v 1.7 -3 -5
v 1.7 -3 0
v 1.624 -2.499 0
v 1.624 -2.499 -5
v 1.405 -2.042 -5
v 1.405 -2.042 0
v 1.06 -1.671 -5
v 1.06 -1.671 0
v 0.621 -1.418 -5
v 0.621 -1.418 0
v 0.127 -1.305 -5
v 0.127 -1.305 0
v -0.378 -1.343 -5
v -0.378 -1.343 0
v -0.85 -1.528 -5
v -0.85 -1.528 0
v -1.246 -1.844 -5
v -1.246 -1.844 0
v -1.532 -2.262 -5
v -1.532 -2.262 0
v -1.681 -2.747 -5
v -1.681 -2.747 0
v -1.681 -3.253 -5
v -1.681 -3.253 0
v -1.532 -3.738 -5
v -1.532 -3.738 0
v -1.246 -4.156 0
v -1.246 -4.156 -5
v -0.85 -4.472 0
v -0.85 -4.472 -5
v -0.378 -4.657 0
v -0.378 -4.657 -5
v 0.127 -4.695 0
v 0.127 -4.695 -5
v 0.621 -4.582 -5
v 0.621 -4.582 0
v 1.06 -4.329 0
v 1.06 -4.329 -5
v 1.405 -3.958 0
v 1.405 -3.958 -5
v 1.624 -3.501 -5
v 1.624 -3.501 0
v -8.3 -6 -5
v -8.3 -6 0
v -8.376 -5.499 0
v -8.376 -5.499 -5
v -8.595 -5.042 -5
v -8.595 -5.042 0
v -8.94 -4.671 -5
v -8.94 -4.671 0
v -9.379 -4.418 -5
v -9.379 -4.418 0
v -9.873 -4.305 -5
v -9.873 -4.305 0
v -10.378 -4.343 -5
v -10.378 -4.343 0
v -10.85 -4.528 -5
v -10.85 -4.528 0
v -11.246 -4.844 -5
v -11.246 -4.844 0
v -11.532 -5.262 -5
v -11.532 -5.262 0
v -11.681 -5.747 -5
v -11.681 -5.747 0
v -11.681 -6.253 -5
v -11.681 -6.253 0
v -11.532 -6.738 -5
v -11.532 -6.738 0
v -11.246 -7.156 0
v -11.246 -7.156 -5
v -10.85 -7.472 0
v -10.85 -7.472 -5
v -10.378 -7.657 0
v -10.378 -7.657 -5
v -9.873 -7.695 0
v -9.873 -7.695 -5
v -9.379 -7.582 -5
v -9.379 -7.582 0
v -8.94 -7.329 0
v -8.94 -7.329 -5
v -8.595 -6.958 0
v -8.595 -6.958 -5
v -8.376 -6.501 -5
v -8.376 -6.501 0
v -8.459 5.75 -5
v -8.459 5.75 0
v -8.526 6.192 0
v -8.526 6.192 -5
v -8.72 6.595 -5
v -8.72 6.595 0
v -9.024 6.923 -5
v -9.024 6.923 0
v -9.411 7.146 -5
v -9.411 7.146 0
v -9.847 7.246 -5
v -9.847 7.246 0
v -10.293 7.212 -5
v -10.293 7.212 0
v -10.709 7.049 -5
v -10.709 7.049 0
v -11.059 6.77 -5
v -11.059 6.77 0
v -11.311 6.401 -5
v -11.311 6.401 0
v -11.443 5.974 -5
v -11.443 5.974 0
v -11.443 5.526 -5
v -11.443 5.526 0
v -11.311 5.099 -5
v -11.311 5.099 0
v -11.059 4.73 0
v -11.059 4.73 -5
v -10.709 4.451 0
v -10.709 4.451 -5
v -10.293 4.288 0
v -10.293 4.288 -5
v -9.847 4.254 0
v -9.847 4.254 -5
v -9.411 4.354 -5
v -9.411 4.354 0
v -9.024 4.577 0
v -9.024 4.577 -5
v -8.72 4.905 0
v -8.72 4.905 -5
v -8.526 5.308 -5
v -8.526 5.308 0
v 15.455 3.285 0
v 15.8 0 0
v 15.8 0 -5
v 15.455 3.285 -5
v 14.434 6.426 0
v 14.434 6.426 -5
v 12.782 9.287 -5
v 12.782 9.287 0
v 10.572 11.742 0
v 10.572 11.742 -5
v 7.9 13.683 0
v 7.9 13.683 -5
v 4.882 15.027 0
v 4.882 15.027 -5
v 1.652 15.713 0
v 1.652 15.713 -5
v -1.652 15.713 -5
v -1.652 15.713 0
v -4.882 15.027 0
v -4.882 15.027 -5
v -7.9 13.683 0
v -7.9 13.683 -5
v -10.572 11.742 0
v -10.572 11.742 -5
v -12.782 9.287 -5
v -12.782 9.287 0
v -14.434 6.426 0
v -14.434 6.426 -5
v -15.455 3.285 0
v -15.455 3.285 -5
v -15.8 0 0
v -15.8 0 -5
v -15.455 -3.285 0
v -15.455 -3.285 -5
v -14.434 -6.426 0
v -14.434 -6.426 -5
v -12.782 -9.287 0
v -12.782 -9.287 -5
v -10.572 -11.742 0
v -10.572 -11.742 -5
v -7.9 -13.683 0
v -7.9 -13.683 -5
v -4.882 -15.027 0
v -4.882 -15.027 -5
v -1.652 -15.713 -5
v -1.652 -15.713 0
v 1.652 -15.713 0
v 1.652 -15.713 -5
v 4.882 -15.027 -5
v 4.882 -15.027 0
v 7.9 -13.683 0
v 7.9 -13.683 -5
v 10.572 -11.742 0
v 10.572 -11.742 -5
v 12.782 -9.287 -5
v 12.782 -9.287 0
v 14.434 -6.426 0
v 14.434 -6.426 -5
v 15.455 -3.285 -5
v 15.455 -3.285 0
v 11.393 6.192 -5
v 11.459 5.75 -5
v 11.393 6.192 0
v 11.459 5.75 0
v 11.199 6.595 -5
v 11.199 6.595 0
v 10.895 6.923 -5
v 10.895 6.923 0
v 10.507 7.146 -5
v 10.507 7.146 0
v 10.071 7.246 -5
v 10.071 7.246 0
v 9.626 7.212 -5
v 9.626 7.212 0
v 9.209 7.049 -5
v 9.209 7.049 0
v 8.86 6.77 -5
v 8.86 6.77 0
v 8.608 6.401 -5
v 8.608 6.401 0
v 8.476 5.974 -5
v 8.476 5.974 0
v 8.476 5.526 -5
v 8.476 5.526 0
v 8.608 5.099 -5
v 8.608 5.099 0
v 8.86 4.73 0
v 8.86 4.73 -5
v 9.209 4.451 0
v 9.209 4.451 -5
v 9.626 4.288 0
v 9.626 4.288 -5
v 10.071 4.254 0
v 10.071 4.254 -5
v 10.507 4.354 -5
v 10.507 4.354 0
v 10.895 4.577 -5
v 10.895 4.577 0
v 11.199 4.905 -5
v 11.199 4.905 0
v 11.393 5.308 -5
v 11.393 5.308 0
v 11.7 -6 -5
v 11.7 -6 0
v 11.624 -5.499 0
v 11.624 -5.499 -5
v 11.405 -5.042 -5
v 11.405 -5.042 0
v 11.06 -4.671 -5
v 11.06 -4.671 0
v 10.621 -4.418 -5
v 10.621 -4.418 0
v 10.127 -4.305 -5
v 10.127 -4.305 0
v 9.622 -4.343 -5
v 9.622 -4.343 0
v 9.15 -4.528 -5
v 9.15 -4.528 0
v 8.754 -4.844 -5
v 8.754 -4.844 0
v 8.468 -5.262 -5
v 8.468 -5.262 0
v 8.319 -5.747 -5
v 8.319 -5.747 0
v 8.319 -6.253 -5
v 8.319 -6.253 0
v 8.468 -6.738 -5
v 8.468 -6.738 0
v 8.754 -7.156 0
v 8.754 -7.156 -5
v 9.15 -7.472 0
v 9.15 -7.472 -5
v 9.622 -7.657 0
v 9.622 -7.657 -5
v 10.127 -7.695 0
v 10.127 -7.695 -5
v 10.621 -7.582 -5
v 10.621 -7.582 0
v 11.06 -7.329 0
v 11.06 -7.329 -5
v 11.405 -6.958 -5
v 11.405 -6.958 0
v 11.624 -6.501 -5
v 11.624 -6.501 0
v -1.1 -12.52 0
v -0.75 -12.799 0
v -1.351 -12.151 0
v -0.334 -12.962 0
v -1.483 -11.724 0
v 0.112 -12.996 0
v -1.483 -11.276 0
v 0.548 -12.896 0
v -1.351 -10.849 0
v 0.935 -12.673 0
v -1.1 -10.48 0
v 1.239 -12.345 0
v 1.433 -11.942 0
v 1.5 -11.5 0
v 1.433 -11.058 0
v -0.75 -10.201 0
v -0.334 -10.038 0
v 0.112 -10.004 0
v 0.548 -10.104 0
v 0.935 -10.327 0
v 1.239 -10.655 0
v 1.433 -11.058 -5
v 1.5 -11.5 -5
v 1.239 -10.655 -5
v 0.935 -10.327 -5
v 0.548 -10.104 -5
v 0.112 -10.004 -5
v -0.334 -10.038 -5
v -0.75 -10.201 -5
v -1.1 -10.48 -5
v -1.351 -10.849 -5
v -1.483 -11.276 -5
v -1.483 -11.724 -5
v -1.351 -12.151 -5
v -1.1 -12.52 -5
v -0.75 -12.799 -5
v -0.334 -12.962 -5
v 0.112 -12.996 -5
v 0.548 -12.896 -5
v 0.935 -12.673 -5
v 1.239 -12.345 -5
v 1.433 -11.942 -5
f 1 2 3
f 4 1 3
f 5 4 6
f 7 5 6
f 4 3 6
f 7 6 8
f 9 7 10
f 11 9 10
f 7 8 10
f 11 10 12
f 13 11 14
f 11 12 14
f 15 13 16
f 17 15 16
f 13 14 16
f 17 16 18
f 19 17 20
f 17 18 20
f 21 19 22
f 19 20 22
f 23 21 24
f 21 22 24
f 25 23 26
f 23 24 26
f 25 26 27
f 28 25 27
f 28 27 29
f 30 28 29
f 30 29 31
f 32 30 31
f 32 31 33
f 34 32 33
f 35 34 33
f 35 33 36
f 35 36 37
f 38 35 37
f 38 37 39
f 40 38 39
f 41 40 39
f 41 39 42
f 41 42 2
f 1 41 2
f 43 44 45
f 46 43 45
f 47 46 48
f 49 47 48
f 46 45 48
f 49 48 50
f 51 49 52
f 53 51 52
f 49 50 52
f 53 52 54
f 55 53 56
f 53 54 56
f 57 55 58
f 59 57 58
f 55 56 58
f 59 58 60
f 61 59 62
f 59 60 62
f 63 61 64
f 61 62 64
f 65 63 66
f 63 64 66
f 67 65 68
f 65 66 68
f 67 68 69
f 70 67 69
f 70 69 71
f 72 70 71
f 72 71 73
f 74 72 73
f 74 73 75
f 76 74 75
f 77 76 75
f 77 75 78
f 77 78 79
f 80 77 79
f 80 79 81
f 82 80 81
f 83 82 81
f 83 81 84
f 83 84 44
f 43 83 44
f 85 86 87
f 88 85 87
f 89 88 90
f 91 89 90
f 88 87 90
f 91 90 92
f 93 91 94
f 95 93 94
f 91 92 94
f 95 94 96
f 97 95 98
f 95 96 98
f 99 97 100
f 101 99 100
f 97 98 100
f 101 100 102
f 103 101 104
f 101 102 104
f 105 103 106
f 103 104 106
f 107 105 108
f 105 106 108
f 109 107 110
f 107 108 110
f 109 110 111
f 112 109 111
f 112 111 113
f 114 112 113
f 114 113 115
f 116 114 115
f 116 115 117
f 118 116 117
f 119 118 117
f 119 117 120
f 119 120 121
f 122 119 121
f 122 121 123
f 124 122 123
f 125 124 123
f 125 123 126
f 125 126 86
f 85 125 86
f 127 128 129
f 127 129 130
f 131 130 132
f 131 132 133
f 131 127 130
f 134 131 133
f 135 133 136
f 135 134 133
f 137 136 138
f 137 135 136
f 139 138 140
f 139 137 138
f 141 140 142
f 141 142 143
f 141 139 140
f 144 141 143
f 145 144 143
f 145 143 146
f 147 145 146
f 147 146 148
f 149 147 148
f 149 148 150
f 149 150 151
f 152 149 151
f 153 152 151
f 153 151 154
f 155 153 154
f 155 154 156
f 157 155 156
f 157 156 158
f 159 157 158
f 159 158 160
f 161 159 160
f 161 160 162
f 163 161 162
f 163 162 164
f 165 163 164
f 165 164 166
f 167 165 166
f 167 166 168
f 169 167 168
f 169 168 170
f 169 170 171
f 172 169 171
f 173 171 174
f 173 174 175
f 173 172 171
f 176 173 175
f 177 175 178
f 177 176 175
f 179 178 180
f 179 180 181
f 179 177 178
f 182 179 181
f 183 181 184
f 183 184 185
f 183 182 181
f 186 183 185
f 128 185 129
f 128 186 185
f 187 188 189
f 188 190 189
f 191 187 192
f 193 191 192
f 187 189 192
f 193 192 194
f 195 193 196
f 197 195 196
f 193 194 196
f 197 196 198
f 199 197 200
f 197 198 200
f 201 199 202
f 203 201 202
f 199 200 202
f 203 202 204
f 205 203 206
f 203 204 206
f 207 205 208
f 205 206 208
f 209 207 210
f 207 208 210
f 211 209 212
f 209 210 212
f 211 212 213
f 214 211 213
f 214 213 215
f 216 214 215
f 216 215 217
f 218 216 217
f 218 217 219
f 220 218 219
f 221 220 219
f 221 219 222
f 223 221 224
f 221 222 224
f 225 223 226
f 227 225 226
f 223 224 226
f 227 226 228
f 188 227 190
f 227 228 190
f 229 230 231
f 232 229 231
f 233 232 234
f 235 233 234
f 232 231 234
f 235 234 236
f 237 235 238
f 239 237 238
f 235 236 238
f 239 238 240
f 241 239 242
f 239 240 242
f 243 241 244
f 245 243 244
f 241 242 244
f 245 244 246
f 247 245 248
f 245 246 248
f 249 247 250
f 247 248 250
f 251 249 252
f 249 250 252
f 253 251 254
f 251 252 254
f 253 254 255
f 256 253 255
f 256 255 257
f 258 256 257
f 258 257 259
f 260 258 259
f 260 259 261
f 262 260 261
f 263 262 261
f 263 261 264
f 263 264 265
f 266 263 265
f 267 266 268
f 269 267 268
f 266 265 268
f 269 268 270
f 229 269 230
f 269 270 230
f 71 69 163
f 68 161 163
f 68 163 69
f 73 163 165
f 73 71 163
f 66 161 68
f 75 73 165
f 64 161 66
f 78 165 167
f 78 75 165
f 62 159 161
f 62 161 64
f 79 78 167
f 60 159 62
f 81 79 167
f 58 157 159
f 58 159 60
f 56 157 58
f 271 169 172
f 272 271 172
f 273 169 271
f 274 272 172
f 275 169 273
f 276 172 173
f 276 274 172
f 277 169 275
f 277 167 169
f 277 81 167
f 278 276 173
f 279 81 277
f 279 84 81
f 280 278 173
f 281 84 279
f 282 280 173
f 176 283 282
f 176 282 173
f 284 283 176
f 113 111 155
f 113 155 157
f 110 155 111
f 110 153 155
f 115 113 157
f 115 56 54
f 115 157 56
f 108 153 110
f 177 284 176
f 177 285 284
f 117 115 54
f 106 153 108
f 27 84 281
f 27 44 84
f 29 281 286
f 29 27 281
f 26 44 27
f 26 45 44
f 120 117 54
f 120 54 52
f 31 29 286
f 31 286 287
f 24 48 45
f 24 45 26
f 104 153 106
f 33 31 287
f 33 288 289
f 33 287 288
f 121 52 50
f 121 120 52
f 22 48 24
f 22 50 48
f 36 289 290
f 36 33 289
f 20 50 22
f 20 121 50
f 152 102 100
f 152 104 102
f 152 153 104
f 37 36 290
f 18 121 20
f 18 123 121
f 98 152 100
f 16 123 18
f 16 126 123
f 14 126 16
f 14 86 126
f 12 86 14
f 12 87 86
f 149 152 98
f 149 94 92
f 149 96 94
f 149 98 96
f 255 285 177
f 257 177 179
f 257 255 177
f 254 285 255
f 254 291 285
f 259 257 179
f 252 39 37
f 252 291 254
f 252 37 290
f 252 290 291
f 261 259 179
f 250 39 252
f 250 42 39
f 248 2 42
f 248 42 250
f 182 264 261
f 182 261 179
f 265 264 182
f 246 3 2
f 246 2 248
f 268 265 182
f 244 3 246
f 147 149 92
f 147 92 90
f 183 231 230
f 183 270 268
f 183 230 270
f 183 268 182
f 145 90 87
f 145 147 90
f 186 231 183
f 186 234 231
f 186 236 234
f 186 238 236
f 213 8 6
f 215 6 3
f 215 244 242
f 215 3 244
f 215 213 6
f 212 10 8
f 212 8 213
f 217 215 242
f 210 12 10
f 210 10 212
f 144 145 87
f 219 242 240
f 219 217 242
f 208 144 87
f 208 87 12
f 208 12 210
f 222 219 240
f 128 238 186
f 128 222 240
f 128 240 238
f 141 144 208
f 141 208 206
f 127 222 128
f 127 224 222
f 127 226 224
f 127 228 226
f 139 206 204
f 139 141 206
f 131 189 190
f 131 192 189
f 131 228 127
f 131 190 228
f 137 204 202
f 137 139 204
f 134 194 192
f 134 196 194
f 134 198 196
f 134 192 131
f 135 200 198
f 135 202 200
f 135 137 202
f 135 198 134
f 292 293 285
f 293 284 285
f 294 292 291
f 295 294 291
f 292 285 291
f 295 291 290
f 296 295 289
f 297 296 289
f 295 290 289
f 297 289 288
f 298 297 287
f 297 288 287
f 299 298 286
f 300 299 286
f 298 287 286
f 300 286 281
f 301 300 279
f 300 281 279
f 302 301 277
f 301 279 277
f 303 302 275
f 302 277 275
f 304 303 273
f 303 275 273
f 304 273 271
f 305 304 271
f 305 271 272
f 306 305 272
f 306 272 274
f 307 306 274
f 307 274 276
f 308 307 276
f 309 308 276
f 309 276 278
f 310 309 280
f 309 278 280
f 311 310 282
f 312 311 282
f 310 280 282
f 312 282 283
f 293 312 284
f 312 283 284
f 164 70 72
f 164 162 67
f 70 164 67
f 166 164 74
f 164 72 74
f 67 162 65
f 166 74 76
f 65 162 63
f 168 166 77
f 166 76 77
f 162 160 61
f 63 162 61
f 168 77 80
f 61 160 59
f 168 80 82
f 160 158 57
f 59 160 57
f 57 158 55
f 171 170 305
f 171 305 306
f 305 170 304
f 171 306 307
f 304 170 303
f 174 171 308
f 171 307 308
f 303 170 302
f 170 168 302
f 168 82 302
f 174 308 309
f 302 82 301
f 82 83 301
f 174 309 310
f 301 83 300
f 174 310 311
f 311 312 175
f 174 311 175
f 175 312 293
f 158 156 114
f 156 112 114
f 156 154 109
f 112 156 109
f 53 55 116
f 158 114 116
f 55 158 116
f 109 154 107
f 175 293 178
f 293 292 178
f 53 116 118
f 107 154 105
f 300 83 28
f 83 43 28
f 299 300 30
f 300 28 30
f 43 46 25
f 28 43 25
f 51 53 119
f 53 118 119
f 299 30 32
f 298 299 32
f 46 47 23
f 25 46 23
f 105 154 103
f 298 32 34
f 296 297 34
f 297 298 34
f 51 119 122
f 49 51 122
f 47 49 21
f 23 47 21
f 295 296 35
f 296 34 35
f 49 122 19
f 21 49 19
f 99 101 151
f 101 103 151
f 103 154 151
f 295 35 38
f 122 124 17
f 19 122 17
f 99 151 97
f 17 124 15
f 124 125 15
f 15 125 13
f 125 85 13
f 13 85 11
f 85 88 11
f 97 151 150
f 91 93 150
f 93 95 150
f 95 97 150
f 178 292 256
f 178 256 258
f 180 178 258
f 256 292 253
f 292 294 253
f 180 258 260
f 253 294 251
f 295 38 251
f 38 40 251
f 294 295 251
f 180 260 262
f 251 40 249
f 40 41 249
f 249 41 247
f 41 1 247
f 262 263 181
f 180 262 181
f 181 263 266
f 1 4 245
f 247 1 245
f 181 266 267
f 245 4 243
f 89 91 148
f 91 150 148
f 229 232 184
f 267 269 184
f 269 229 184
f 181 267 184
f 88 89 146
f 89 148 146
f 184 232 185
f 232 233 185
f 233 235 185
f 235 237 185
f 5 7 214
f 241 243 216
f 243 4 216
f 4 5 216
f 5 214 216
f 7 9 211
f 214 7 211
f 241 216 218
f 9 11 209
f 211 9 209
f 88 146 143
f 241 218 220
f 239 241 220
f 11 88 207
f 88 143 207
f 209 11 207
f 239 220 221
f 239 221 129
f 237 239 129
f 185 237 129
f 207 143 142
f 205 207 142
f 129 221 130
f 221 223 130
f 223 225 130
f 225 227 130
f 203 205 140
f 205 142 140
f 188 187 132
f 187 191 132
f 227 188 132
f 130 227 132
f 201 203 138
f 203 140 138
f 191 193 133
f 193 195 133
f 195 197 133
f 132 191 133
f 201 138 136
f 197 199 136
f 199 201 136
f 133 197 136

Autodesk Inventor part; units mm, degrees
ref_plane "YZ Plane" through (0, 0, 0) normal (1, 0, 0) x (0, 1, 0)
ref_plane "XZ Plane" through (0, 0, 0) normal (0, 1, 0) x (-1, 0, 0)
ref_plane "XY Plane" through (0, 0, 0) normal (0, 0, 1) x (1, 0, 0)
sketch "スケッチ2" plane through (0, 0, 0) normal (0, 0, 1) x (1, 0, 0)
  circle A0 centre (0, 0) radius 15.8
  dimension "d0" = 31.6
extrude "押し出し1" add sketch "スケッチ2" against normal blind 5
sketch "スケッチ3" plane through (0, 0, 0) normal (0, 0, 1) x (1, 0, 0)
  line L0 (0, 0) -> (0, 20.2537) construction
  circle A0 centre (0, -3) radius 1.7
  circle A1 centre (-10, -6) radius 1.7
  circle A2 centre (10, -6) radius 1.7
  dimension "d32" = 3.4
  dimension "d33" = 3
  dimension "d67" = 3.4
  dimension "d68" = 3.4
  dimension "d69" = 10
  dimension "d70" = 6
extrude "押し出し2" cut sketch "スケッチ3" against normal through all
sketch "スケッチ10" plane through (0, 0, 0) normal (0, 0, 1) x (1, 0, 0)
  circle A0 centre (0, -11.5) radius 1.5
  circle A1 centre (9.9593, 5.75) radius 1.5
  circle A2 centre (-9.9593, 5.75) radius 1.5
  point P0 (0, 0)
  dimension "d71" = 3
  dimension "d72" = 11.5
  dimension "d75" = 360
extrude "押し出し8" cut sketch "スケッチ10" against normal through all
thread "ねじ6" size "M3x0.5" class "6H" standard "ANSI Metric M Profile" full length
thread "ねじ7" size "M3x0.5" class "6H" standard "ANSI Metric M Profile" full length
thread "ねじ8" size "M3x0.5" class "6H" standard "ANSI Metric M Profile" full length
properties part number "B_pipe_cylinder_5" material "ステンレス鋼 440C"
